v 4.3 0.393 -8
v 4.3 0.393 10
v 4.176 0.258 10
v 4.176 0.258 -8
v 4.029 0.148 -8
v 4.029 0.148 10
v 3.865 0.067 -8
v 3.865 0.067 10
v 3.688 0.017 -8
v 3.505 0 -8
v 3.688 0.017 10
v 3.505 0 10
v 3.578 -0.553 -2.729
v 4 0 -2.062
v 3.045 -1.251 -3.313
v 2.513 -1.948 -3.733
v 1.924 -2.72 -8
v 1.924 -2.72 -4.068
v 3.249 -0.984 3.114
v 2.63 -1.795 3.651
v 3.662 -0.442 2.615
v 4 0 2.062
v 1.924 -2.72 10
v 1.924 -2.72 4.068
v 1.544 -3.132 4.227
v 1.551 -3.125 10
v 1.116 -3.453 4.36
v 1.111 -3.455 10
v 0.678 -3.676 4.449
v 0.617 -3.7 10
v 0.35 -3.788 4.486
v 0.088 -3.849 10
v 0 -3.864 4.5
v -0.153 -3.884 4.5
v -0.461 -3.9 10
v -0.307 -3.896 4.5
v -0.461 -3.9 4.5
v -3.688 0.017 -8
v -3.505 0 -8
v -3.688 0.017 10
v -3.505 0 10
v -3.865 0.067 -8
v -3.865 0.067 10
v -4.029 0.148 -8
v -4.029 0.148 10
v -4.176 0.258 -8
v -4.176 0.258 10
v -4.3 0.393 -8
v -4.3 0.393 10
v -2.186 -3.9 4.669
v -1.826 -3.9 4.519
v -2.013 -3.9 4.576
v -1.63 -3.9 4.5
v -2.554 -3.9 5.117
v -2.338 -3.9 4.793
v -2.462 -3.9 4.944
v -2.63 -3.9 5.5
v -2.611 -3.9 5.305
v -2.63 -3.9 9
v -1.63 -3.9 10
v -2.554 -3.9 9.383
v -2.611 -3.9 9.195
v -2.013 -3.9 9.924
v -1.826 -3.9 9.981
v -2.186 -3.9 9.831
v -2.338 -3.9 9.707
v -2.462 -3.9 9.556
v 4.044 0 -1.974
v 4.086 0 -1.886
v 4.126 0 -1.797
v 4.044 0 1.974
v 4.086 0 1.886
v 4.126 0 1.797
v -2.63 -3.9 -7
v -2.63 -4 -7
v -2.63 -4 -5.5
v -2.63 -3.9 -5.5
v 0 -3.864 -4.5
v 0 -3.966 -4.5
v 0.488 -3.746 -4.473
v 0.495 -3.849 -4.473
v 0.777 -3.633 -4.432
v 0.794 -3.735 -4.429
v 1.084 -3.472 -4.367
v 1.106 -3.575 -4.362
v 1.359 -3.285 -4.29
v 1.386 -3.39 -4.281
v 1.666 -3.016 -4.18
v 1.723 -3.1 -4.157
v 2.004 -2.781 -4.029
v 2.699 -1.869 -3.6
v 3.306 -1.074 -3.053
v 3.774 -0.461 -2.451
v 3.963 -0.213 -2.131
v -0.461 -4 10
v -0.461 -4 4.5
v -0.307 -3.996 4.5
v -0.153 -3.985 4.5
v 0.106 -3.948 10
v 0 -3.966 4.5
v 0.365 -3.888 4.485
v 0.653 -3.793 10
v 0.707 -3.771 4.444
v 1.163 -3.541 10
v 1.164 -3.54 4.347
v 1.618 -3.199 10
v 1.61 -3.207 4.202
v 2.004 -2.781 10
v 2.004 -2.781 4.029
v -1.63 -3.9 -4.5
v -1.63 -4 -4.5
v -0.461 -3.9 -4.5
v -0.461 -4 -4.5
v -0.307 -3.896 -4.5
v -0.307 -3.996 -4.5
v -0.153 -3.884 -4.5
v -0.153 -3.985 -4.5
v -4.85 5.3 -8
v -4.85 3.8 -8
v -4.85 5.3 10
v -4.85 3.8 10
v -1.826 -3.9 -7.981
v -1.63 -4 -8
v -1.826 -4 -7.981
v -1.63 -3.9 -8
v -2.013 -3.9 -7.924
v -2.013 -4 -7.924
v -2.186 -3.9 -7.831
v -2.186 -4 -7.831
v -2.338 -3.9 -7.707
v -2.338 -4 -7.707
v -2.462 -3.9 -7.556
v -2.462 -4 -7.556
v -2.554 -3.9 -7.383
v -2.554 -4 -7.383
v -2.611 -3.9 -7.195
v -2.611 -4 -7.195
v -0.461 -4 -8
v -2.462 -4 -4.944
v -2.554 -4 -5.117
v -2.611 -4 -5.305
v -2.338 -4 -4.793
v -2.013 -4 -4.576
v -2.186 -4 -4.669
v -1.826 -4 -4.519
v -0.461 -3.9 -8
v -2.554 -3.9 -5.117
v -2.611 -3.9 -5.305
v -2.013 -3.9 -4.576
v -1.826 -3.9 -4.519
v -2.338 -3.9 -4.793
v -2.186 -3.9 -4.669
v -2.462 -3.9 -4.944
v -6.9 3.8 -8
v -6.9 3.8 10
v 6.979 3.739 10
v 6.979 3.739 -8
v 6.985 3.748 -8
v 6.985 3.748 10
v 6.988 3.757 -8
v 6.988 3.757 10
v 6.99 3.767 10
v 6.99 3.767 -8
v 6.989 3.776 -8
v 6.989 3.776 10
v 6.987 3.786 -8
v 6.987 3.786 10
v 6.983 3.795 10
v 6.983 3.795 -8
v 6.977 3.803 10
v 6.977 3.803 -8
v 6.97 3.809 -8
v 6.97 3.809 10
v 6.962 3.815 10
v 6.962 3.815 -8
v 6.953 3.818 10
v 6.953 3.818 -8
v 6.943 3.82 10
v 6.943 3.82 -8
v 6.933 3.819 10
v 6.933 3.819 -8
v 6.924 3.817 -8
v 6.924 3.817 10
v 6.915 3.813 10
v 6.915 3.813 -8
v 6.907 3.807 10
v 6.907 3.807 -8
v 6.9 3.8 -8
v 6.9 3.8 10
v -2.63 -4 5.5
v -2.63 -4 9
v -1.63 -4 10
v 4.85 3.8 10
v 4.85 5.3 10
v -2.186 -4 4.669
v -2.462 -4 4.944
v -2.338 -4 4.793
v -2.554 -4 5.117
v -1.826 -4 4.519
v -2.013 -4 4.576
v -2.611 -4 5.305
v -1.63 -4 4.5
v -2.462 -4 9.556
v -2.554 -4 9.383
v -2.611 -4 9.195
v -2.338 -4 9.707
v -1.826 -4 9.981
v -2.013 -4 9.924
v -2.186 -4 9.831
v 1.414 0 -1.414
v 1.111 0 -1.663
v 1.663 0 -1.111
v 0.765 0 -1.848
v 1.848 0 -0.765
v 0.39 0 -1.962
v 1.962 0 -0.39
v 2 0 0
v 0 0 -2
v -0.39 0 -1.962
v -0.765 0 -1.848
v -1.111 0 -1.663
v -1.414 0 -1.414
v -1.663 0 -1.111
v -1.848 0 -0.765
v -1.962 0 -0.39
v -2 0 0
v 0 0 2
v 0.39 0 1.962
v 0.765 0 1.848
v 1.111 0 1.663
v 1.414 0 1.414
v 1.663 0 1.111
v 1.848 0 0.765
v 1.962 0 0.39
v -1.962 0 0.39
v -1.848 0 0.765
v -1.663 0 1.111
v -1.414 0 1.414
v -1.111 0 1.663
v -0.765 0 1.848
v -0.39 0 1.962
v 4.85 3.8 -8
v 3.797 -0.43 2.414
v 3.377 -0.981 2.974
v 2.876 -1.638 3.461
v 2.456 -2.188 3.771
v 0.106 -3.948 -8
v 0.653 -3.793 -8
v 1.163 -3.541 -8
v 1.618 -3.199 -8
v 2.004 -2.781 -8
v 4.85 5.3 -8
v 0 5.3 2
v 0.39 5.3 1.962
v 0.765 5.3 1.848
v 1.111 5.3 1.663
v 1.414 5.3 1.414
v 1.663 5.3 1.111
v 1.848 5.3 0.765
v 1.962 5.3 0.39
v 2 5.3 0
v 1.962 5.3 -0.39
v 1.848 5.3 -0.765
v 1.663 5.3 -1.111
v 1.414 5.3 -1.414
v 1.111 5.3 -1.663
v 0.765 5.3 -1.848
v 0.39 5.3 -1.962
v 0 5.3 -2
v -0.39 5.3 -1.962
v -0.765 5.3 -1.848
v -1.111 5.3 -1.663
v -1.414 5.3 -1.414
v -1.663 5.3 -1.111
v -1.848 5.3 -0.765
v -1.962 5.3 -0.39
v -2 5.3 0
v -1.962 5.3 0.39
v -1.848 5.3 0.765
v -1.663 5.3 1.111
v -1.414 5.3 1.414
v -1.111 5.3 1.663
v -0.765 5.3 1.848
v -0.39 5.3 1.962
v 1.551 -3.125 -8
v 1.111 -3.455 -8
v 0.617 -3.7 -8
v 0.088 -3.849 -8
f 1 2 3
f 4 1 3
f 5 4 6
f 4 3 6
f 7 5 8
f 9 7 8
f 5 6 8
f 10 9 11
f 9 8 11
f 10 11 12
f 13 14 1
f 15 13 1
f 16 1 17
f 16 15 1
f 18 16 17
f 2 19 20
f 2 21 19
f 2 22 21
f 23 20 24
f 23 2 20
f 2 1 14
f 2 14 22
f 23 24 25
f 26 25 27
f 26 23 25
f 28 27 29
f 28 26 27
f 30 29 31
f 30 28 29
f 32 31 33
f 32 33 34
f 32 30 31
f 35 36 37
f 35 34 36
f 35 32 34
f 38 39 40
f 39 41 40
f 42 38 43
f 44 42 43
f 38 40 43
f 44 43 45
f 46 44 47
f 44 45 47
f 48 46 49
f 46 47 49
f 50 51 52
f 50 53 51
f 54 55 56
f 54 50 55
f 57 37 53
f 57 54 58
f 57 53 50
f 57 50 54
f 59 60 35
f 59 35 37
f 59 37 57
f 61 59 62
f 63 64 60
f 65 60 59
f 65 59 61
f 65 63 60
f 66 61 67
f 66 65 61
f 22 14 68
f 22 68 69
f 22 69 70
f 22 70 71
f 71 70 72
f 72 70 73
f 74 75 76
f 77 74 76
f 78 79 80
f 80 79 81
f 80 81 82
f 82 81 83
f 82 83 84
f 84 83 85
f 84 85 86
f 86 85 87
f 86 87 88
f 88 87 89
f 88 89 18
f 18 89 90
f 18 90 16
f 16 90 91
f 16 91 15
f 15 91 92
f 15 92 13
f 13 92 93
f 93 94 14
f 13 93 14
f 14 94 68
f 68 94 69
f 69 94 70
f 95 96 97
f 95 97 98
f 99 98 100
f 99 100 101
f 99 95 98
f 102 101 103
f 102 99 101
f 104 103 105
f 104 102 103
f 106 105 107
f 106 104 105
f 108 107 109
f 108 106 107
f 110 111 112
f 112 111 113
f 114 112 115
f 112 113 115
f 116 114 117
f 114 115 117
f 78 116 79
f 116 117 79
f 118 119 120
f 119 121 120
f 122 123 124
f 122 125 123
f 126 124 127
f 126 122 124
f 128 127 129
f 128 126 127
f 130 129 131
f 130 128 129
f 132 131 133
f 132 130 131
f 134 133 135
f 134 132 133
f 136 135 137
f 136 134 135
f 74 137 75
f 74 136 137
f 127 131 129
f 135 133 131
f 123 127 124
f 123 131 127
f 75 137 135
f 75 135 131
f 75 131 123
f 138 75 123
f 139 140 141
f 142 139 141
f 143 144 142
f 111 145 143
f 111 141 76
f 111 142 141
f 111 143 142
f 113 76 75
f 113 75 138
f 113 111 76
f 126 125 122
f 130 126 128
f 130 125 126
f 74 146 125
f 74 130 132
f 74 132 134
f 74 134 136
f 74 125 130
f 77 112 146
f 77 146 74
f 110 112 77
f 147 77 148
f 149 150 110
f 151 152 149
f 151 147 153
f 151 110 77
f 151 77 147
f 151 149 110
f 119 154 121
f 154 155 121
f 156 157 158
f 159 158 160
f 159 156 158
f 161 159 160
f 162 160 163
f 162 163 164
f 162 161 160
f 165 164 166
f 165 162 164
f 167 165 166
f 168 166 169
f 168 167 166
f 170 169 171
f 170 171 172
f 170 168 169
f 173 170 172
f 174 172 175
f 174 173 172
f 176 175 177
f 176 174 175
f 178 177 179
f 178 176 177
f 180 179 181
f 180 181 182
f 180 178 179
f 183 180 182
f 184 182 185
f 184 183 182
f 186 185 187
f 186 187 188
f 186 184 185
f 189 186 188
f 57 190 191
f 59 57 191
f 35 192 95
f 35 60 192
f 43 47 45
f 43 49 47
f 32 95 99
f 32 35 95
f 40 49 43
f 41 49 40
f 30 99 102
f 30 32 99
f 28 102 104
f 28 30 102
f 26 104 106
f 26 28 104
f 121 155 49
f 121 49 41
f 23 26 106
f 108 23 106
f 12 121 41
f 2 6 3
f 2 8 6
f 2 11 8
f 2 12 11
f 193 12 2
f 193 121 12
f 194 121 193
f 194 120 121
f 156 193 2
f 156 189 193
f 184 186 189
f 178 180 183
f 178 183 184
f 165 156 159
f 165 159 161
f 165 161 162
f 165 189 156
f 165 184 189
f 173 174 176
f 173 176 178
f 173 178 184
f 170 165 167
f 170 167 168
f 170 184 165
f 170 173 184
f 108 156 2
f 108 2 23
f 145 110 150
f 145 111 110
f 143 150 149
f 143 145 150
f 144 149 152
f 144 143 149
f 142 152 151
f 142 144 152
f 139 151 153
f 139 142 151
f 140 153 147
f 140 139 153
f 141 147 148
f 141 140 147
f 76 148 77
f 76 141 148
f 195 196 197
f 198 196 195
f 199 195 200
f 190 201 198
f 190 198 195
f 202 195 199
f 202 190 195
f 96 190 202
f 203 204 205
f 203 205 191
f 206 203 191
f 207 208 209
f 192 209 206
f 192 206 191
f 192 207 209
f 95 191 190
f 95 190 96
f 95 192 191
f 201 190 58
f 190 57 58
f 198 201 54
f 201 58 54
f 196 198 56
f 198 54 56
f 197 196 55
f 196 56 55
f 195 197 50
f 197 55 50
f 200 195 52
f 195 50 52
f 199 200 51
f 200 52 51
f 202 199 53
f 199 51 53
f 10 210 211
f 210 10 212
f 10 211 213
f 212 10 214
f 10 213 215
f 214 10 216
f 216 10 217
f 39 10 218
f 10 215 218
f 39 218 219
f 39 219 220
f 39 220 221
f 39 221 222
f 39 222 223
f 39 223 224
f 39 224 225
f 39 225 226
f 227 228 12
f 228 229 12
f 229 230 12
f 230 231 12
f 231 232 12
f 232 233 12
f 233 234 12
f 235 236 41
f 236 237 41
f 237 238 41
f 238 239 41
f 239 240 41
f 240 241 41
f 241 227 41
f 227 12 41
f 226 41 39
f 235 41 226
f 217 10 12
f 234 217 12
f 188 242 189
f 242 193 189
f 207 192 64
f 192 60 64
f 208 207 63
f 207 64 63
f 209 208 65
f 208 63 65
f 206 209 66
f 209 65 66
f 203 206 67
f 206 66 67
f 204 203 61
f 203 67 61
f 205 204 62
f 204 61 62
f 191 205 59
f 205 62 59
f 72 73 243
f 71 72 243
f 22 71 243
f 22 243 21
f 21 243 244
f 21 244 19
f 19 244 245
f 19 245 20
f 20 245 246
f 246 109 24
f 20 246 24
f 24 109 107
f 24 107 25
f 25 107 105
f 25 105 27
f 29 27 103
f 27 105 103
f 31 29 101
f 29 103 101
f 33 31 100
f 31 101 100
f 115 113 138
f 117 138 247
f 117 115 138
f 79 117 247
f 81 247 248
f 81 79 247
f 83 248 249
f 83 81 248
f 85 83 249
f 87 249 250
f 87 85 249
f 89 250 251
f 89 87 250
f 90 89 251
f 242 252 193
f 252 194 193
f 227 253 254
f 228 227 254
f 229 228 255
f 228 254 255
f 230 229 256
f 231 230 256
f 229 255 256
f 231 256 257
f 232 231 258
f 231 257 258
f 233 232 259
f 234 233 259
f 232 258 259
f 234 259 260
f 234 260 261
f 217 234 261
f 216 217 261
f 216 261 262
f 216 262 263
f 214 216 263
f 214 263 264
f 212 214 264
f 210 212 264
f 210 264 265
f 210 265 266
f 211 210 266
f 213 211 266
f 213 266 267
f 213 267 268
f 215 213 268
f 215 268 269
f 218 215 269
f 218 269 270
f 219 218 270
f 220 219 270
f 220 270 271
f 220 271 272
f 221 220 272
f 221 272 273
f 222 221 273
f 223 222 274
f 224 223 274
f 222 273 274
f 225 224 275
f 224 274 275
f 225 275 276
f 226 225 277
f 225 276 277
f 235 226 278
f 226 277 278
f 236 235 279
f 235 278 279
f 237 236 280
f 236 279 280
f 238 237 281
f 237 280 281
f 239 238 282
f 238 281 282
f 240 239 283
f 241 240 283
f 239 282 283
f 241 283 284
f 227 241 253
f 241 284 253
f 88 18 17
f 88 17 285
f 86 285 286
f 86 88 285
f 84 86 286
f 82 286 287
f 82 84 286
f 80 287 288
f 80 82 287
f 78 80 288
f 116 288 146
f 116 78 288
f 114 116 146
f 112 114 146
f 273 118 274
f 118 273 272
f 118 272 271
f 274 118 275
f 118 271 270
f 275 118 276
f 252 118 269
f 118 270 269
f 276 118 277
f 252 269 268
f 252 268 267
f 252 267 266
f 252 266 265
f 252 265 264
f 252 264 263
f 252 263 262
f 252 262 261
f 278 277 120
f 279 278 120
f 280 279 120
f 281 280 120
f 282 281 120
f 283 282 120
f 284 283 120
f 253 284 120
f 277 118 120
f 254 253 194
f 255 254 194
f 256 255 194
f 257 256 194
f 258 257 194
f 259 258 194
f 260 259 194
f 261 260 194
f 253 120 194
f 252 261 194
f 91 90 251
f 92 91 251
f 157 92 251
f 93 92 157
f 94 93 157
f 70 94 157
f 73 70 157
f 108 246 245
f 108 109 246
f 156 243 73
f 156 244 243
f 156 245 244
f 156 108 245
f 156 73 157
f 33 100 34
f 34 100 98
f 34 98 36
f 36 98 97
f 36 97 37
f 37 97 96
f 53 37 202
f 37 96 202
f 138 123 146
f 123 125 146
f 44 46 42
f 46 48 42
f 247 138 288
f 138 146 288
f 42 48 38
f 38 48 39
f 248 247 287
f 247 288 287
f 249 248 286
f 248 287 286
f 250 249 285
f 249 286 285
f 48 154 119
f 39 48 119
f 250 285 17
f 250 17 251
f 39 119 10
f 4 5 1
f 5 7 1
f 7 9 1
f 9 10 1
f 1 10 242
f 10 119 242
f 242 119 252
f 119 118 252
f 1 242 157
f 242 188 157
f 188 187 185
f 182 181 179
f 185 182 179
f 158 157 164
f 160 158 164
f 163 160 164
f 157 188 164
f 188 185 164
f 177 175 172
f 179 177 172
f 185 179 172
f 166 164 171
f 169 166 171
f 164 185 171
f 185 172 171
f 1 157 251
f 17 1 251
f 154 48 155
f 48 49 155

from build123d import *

# Parameters (mm, degrees)
EXTRUDE_1_DEPTH      = 10
EXTRUDE_1_DEPTH_BACK = 8
SKETCH_2_R           = 2
CUT_EXTRUDE_1_DEPTH  = 6.3
EXTRUDE_2_DEPTH      = 18
CUT_EXTRUDE_2_DEPTH  = 4
SKETCH_5_W           = 0.05
SKETCH_5_H           = 18
CUT_EXTRUDE_3_DEPTH  = 1
FILLET_1_R           = 1


with BuildPart() as part:
    # Эскиз1 → Бобышка-Вытянуть1 (new body, two sides)
    with BuildSketch(Plane.XY) as extrude_1_sk:
        with BuildLine():
            Line((3.505219116, 0), (-3.505219116, 0))
            ThreePointArc((-3.505219116, 0), (-3.948686522, 0.1037095), (-4.300170362, 0.393326681))
            Line((-4.300170362, 0.393326681), (-6.9, 3.8))
            Line((-6.9, 3.8), (-4.85, 3.8))
            Line((-4.85, 3.8), (-4.85, 5.3))
            Line((-4.85, 5.3), (4.85, 5.3))
            Line((4.85, 5.3), (4.85, 3.8))
            Line((4.85, 3.8), (6.9, 3.8))
            Line((6.9, 3.8), (4.300170362, 0.393326681))
            ThreePointArc((4.300170362, 0.393326681), (3.948686522, 0.1037095), (3.505219116, 0))
        make_face()
    extrude(amount=EXTRUDE_1_DEPTH)
    extrude(extrude_1_sk.sketch, amount=-EXTRUDE_1_DEPTH_BACK)

    # Эскиз2 → Вырез-Вытянуть1 (cut, through all)
    with BuildSketch(Plane(origin=(0, 5.3, 0), x_dir=(1, 0, 0), z_dir=(0, 1, 0))):
        with Locations(Location((0, 0, 0), (0, 0, 270))):  # turned: the seam where the file's is
            Circle(SKETCH_2_R)
    extrude(amount=-CUT_EXTRUDE_1_DEPTH, mode=Mode.SUBTRACT)

    # Эскиз3 → Бобышка-Вытянуть2 (add)
    with BuildSketch(Plane.XY.offset(10)):
        with BuildLine():
            Line((6.9, 3.8), (1.924195295, -2.720019958))
            ThreePointArc((1.924195295, -2.720019958), (0.869743776, -3.588871499), (-0.460658443, -3.9))
            Line((-0.460658443, -3.9), (-2.630413016, -3.9))
            ThreePointArc((-2.630413016, -3.9), (-2.680413016, -3.95), (-2.630413016, -4))
            Line((-2.630413016, -4), (-0.460658443, -4))
            ThreePointArc((-0.460658443, -4), (0.914090516, -3.678500549), (2.00369042, -2.78068729))
            Line((2.00369042, -2.78068729), (6.979495125, 3.739332668))
            ThreePointArc((6.979495125, 3.739332668), (6.970081228, 3.809413896), (6.9, 3.8))
        make_face()
    extrude(amount=-EXTRUDE_2_DEPTH)

    # Эскиз4 → Вырез-Вытянуть2 (cut)
    with BuildSketch(Plane.XZ.offset(4)):
        with BuildLine():
            Line((0, 4.5), (-4.5, 4.5))
            Line((-4.5, 4.5), (-4.5, 0))
            Line((-4.5, 0), (-4.5, -4.5))
            Line((-4.5, -4.5), (0, -4.5))
            ThreePointArc((0, -4.5), (4.5, 0), (0, 4.5))
        make_face()
    extrude(amount=-CUT_EXTRUDE_2_DEPTH, mode=Mode.SUBTRACT)

    # Эскиз5 → Вырез-Вытянуть3 (cut)
    with BuildSketch(Plane.XZ.offset(4)):
        with Locations((-2.655413016, 1)):
            Rectangle(SKETCH_5_W, SKETCH_5_H)
    extrude(amount=-CUT_EXTRUDE_3_DEPTH, mode=Mode.SUBTRACT)

    # Скругление1
    fillet_1_edges = [part.edges().sort_by_distance(p)[0] for p in [
        (-2.630413016, -3.95, 4.5),
        (-2.630413016, -3.95, -4.5),
        (-2.630413016, -3.95, 10),
        (-2.630413016, -3.95, -8),
    ]]
    fillet(fillet_1_edges, radius=FILLET_1_R)


solid = part.part
